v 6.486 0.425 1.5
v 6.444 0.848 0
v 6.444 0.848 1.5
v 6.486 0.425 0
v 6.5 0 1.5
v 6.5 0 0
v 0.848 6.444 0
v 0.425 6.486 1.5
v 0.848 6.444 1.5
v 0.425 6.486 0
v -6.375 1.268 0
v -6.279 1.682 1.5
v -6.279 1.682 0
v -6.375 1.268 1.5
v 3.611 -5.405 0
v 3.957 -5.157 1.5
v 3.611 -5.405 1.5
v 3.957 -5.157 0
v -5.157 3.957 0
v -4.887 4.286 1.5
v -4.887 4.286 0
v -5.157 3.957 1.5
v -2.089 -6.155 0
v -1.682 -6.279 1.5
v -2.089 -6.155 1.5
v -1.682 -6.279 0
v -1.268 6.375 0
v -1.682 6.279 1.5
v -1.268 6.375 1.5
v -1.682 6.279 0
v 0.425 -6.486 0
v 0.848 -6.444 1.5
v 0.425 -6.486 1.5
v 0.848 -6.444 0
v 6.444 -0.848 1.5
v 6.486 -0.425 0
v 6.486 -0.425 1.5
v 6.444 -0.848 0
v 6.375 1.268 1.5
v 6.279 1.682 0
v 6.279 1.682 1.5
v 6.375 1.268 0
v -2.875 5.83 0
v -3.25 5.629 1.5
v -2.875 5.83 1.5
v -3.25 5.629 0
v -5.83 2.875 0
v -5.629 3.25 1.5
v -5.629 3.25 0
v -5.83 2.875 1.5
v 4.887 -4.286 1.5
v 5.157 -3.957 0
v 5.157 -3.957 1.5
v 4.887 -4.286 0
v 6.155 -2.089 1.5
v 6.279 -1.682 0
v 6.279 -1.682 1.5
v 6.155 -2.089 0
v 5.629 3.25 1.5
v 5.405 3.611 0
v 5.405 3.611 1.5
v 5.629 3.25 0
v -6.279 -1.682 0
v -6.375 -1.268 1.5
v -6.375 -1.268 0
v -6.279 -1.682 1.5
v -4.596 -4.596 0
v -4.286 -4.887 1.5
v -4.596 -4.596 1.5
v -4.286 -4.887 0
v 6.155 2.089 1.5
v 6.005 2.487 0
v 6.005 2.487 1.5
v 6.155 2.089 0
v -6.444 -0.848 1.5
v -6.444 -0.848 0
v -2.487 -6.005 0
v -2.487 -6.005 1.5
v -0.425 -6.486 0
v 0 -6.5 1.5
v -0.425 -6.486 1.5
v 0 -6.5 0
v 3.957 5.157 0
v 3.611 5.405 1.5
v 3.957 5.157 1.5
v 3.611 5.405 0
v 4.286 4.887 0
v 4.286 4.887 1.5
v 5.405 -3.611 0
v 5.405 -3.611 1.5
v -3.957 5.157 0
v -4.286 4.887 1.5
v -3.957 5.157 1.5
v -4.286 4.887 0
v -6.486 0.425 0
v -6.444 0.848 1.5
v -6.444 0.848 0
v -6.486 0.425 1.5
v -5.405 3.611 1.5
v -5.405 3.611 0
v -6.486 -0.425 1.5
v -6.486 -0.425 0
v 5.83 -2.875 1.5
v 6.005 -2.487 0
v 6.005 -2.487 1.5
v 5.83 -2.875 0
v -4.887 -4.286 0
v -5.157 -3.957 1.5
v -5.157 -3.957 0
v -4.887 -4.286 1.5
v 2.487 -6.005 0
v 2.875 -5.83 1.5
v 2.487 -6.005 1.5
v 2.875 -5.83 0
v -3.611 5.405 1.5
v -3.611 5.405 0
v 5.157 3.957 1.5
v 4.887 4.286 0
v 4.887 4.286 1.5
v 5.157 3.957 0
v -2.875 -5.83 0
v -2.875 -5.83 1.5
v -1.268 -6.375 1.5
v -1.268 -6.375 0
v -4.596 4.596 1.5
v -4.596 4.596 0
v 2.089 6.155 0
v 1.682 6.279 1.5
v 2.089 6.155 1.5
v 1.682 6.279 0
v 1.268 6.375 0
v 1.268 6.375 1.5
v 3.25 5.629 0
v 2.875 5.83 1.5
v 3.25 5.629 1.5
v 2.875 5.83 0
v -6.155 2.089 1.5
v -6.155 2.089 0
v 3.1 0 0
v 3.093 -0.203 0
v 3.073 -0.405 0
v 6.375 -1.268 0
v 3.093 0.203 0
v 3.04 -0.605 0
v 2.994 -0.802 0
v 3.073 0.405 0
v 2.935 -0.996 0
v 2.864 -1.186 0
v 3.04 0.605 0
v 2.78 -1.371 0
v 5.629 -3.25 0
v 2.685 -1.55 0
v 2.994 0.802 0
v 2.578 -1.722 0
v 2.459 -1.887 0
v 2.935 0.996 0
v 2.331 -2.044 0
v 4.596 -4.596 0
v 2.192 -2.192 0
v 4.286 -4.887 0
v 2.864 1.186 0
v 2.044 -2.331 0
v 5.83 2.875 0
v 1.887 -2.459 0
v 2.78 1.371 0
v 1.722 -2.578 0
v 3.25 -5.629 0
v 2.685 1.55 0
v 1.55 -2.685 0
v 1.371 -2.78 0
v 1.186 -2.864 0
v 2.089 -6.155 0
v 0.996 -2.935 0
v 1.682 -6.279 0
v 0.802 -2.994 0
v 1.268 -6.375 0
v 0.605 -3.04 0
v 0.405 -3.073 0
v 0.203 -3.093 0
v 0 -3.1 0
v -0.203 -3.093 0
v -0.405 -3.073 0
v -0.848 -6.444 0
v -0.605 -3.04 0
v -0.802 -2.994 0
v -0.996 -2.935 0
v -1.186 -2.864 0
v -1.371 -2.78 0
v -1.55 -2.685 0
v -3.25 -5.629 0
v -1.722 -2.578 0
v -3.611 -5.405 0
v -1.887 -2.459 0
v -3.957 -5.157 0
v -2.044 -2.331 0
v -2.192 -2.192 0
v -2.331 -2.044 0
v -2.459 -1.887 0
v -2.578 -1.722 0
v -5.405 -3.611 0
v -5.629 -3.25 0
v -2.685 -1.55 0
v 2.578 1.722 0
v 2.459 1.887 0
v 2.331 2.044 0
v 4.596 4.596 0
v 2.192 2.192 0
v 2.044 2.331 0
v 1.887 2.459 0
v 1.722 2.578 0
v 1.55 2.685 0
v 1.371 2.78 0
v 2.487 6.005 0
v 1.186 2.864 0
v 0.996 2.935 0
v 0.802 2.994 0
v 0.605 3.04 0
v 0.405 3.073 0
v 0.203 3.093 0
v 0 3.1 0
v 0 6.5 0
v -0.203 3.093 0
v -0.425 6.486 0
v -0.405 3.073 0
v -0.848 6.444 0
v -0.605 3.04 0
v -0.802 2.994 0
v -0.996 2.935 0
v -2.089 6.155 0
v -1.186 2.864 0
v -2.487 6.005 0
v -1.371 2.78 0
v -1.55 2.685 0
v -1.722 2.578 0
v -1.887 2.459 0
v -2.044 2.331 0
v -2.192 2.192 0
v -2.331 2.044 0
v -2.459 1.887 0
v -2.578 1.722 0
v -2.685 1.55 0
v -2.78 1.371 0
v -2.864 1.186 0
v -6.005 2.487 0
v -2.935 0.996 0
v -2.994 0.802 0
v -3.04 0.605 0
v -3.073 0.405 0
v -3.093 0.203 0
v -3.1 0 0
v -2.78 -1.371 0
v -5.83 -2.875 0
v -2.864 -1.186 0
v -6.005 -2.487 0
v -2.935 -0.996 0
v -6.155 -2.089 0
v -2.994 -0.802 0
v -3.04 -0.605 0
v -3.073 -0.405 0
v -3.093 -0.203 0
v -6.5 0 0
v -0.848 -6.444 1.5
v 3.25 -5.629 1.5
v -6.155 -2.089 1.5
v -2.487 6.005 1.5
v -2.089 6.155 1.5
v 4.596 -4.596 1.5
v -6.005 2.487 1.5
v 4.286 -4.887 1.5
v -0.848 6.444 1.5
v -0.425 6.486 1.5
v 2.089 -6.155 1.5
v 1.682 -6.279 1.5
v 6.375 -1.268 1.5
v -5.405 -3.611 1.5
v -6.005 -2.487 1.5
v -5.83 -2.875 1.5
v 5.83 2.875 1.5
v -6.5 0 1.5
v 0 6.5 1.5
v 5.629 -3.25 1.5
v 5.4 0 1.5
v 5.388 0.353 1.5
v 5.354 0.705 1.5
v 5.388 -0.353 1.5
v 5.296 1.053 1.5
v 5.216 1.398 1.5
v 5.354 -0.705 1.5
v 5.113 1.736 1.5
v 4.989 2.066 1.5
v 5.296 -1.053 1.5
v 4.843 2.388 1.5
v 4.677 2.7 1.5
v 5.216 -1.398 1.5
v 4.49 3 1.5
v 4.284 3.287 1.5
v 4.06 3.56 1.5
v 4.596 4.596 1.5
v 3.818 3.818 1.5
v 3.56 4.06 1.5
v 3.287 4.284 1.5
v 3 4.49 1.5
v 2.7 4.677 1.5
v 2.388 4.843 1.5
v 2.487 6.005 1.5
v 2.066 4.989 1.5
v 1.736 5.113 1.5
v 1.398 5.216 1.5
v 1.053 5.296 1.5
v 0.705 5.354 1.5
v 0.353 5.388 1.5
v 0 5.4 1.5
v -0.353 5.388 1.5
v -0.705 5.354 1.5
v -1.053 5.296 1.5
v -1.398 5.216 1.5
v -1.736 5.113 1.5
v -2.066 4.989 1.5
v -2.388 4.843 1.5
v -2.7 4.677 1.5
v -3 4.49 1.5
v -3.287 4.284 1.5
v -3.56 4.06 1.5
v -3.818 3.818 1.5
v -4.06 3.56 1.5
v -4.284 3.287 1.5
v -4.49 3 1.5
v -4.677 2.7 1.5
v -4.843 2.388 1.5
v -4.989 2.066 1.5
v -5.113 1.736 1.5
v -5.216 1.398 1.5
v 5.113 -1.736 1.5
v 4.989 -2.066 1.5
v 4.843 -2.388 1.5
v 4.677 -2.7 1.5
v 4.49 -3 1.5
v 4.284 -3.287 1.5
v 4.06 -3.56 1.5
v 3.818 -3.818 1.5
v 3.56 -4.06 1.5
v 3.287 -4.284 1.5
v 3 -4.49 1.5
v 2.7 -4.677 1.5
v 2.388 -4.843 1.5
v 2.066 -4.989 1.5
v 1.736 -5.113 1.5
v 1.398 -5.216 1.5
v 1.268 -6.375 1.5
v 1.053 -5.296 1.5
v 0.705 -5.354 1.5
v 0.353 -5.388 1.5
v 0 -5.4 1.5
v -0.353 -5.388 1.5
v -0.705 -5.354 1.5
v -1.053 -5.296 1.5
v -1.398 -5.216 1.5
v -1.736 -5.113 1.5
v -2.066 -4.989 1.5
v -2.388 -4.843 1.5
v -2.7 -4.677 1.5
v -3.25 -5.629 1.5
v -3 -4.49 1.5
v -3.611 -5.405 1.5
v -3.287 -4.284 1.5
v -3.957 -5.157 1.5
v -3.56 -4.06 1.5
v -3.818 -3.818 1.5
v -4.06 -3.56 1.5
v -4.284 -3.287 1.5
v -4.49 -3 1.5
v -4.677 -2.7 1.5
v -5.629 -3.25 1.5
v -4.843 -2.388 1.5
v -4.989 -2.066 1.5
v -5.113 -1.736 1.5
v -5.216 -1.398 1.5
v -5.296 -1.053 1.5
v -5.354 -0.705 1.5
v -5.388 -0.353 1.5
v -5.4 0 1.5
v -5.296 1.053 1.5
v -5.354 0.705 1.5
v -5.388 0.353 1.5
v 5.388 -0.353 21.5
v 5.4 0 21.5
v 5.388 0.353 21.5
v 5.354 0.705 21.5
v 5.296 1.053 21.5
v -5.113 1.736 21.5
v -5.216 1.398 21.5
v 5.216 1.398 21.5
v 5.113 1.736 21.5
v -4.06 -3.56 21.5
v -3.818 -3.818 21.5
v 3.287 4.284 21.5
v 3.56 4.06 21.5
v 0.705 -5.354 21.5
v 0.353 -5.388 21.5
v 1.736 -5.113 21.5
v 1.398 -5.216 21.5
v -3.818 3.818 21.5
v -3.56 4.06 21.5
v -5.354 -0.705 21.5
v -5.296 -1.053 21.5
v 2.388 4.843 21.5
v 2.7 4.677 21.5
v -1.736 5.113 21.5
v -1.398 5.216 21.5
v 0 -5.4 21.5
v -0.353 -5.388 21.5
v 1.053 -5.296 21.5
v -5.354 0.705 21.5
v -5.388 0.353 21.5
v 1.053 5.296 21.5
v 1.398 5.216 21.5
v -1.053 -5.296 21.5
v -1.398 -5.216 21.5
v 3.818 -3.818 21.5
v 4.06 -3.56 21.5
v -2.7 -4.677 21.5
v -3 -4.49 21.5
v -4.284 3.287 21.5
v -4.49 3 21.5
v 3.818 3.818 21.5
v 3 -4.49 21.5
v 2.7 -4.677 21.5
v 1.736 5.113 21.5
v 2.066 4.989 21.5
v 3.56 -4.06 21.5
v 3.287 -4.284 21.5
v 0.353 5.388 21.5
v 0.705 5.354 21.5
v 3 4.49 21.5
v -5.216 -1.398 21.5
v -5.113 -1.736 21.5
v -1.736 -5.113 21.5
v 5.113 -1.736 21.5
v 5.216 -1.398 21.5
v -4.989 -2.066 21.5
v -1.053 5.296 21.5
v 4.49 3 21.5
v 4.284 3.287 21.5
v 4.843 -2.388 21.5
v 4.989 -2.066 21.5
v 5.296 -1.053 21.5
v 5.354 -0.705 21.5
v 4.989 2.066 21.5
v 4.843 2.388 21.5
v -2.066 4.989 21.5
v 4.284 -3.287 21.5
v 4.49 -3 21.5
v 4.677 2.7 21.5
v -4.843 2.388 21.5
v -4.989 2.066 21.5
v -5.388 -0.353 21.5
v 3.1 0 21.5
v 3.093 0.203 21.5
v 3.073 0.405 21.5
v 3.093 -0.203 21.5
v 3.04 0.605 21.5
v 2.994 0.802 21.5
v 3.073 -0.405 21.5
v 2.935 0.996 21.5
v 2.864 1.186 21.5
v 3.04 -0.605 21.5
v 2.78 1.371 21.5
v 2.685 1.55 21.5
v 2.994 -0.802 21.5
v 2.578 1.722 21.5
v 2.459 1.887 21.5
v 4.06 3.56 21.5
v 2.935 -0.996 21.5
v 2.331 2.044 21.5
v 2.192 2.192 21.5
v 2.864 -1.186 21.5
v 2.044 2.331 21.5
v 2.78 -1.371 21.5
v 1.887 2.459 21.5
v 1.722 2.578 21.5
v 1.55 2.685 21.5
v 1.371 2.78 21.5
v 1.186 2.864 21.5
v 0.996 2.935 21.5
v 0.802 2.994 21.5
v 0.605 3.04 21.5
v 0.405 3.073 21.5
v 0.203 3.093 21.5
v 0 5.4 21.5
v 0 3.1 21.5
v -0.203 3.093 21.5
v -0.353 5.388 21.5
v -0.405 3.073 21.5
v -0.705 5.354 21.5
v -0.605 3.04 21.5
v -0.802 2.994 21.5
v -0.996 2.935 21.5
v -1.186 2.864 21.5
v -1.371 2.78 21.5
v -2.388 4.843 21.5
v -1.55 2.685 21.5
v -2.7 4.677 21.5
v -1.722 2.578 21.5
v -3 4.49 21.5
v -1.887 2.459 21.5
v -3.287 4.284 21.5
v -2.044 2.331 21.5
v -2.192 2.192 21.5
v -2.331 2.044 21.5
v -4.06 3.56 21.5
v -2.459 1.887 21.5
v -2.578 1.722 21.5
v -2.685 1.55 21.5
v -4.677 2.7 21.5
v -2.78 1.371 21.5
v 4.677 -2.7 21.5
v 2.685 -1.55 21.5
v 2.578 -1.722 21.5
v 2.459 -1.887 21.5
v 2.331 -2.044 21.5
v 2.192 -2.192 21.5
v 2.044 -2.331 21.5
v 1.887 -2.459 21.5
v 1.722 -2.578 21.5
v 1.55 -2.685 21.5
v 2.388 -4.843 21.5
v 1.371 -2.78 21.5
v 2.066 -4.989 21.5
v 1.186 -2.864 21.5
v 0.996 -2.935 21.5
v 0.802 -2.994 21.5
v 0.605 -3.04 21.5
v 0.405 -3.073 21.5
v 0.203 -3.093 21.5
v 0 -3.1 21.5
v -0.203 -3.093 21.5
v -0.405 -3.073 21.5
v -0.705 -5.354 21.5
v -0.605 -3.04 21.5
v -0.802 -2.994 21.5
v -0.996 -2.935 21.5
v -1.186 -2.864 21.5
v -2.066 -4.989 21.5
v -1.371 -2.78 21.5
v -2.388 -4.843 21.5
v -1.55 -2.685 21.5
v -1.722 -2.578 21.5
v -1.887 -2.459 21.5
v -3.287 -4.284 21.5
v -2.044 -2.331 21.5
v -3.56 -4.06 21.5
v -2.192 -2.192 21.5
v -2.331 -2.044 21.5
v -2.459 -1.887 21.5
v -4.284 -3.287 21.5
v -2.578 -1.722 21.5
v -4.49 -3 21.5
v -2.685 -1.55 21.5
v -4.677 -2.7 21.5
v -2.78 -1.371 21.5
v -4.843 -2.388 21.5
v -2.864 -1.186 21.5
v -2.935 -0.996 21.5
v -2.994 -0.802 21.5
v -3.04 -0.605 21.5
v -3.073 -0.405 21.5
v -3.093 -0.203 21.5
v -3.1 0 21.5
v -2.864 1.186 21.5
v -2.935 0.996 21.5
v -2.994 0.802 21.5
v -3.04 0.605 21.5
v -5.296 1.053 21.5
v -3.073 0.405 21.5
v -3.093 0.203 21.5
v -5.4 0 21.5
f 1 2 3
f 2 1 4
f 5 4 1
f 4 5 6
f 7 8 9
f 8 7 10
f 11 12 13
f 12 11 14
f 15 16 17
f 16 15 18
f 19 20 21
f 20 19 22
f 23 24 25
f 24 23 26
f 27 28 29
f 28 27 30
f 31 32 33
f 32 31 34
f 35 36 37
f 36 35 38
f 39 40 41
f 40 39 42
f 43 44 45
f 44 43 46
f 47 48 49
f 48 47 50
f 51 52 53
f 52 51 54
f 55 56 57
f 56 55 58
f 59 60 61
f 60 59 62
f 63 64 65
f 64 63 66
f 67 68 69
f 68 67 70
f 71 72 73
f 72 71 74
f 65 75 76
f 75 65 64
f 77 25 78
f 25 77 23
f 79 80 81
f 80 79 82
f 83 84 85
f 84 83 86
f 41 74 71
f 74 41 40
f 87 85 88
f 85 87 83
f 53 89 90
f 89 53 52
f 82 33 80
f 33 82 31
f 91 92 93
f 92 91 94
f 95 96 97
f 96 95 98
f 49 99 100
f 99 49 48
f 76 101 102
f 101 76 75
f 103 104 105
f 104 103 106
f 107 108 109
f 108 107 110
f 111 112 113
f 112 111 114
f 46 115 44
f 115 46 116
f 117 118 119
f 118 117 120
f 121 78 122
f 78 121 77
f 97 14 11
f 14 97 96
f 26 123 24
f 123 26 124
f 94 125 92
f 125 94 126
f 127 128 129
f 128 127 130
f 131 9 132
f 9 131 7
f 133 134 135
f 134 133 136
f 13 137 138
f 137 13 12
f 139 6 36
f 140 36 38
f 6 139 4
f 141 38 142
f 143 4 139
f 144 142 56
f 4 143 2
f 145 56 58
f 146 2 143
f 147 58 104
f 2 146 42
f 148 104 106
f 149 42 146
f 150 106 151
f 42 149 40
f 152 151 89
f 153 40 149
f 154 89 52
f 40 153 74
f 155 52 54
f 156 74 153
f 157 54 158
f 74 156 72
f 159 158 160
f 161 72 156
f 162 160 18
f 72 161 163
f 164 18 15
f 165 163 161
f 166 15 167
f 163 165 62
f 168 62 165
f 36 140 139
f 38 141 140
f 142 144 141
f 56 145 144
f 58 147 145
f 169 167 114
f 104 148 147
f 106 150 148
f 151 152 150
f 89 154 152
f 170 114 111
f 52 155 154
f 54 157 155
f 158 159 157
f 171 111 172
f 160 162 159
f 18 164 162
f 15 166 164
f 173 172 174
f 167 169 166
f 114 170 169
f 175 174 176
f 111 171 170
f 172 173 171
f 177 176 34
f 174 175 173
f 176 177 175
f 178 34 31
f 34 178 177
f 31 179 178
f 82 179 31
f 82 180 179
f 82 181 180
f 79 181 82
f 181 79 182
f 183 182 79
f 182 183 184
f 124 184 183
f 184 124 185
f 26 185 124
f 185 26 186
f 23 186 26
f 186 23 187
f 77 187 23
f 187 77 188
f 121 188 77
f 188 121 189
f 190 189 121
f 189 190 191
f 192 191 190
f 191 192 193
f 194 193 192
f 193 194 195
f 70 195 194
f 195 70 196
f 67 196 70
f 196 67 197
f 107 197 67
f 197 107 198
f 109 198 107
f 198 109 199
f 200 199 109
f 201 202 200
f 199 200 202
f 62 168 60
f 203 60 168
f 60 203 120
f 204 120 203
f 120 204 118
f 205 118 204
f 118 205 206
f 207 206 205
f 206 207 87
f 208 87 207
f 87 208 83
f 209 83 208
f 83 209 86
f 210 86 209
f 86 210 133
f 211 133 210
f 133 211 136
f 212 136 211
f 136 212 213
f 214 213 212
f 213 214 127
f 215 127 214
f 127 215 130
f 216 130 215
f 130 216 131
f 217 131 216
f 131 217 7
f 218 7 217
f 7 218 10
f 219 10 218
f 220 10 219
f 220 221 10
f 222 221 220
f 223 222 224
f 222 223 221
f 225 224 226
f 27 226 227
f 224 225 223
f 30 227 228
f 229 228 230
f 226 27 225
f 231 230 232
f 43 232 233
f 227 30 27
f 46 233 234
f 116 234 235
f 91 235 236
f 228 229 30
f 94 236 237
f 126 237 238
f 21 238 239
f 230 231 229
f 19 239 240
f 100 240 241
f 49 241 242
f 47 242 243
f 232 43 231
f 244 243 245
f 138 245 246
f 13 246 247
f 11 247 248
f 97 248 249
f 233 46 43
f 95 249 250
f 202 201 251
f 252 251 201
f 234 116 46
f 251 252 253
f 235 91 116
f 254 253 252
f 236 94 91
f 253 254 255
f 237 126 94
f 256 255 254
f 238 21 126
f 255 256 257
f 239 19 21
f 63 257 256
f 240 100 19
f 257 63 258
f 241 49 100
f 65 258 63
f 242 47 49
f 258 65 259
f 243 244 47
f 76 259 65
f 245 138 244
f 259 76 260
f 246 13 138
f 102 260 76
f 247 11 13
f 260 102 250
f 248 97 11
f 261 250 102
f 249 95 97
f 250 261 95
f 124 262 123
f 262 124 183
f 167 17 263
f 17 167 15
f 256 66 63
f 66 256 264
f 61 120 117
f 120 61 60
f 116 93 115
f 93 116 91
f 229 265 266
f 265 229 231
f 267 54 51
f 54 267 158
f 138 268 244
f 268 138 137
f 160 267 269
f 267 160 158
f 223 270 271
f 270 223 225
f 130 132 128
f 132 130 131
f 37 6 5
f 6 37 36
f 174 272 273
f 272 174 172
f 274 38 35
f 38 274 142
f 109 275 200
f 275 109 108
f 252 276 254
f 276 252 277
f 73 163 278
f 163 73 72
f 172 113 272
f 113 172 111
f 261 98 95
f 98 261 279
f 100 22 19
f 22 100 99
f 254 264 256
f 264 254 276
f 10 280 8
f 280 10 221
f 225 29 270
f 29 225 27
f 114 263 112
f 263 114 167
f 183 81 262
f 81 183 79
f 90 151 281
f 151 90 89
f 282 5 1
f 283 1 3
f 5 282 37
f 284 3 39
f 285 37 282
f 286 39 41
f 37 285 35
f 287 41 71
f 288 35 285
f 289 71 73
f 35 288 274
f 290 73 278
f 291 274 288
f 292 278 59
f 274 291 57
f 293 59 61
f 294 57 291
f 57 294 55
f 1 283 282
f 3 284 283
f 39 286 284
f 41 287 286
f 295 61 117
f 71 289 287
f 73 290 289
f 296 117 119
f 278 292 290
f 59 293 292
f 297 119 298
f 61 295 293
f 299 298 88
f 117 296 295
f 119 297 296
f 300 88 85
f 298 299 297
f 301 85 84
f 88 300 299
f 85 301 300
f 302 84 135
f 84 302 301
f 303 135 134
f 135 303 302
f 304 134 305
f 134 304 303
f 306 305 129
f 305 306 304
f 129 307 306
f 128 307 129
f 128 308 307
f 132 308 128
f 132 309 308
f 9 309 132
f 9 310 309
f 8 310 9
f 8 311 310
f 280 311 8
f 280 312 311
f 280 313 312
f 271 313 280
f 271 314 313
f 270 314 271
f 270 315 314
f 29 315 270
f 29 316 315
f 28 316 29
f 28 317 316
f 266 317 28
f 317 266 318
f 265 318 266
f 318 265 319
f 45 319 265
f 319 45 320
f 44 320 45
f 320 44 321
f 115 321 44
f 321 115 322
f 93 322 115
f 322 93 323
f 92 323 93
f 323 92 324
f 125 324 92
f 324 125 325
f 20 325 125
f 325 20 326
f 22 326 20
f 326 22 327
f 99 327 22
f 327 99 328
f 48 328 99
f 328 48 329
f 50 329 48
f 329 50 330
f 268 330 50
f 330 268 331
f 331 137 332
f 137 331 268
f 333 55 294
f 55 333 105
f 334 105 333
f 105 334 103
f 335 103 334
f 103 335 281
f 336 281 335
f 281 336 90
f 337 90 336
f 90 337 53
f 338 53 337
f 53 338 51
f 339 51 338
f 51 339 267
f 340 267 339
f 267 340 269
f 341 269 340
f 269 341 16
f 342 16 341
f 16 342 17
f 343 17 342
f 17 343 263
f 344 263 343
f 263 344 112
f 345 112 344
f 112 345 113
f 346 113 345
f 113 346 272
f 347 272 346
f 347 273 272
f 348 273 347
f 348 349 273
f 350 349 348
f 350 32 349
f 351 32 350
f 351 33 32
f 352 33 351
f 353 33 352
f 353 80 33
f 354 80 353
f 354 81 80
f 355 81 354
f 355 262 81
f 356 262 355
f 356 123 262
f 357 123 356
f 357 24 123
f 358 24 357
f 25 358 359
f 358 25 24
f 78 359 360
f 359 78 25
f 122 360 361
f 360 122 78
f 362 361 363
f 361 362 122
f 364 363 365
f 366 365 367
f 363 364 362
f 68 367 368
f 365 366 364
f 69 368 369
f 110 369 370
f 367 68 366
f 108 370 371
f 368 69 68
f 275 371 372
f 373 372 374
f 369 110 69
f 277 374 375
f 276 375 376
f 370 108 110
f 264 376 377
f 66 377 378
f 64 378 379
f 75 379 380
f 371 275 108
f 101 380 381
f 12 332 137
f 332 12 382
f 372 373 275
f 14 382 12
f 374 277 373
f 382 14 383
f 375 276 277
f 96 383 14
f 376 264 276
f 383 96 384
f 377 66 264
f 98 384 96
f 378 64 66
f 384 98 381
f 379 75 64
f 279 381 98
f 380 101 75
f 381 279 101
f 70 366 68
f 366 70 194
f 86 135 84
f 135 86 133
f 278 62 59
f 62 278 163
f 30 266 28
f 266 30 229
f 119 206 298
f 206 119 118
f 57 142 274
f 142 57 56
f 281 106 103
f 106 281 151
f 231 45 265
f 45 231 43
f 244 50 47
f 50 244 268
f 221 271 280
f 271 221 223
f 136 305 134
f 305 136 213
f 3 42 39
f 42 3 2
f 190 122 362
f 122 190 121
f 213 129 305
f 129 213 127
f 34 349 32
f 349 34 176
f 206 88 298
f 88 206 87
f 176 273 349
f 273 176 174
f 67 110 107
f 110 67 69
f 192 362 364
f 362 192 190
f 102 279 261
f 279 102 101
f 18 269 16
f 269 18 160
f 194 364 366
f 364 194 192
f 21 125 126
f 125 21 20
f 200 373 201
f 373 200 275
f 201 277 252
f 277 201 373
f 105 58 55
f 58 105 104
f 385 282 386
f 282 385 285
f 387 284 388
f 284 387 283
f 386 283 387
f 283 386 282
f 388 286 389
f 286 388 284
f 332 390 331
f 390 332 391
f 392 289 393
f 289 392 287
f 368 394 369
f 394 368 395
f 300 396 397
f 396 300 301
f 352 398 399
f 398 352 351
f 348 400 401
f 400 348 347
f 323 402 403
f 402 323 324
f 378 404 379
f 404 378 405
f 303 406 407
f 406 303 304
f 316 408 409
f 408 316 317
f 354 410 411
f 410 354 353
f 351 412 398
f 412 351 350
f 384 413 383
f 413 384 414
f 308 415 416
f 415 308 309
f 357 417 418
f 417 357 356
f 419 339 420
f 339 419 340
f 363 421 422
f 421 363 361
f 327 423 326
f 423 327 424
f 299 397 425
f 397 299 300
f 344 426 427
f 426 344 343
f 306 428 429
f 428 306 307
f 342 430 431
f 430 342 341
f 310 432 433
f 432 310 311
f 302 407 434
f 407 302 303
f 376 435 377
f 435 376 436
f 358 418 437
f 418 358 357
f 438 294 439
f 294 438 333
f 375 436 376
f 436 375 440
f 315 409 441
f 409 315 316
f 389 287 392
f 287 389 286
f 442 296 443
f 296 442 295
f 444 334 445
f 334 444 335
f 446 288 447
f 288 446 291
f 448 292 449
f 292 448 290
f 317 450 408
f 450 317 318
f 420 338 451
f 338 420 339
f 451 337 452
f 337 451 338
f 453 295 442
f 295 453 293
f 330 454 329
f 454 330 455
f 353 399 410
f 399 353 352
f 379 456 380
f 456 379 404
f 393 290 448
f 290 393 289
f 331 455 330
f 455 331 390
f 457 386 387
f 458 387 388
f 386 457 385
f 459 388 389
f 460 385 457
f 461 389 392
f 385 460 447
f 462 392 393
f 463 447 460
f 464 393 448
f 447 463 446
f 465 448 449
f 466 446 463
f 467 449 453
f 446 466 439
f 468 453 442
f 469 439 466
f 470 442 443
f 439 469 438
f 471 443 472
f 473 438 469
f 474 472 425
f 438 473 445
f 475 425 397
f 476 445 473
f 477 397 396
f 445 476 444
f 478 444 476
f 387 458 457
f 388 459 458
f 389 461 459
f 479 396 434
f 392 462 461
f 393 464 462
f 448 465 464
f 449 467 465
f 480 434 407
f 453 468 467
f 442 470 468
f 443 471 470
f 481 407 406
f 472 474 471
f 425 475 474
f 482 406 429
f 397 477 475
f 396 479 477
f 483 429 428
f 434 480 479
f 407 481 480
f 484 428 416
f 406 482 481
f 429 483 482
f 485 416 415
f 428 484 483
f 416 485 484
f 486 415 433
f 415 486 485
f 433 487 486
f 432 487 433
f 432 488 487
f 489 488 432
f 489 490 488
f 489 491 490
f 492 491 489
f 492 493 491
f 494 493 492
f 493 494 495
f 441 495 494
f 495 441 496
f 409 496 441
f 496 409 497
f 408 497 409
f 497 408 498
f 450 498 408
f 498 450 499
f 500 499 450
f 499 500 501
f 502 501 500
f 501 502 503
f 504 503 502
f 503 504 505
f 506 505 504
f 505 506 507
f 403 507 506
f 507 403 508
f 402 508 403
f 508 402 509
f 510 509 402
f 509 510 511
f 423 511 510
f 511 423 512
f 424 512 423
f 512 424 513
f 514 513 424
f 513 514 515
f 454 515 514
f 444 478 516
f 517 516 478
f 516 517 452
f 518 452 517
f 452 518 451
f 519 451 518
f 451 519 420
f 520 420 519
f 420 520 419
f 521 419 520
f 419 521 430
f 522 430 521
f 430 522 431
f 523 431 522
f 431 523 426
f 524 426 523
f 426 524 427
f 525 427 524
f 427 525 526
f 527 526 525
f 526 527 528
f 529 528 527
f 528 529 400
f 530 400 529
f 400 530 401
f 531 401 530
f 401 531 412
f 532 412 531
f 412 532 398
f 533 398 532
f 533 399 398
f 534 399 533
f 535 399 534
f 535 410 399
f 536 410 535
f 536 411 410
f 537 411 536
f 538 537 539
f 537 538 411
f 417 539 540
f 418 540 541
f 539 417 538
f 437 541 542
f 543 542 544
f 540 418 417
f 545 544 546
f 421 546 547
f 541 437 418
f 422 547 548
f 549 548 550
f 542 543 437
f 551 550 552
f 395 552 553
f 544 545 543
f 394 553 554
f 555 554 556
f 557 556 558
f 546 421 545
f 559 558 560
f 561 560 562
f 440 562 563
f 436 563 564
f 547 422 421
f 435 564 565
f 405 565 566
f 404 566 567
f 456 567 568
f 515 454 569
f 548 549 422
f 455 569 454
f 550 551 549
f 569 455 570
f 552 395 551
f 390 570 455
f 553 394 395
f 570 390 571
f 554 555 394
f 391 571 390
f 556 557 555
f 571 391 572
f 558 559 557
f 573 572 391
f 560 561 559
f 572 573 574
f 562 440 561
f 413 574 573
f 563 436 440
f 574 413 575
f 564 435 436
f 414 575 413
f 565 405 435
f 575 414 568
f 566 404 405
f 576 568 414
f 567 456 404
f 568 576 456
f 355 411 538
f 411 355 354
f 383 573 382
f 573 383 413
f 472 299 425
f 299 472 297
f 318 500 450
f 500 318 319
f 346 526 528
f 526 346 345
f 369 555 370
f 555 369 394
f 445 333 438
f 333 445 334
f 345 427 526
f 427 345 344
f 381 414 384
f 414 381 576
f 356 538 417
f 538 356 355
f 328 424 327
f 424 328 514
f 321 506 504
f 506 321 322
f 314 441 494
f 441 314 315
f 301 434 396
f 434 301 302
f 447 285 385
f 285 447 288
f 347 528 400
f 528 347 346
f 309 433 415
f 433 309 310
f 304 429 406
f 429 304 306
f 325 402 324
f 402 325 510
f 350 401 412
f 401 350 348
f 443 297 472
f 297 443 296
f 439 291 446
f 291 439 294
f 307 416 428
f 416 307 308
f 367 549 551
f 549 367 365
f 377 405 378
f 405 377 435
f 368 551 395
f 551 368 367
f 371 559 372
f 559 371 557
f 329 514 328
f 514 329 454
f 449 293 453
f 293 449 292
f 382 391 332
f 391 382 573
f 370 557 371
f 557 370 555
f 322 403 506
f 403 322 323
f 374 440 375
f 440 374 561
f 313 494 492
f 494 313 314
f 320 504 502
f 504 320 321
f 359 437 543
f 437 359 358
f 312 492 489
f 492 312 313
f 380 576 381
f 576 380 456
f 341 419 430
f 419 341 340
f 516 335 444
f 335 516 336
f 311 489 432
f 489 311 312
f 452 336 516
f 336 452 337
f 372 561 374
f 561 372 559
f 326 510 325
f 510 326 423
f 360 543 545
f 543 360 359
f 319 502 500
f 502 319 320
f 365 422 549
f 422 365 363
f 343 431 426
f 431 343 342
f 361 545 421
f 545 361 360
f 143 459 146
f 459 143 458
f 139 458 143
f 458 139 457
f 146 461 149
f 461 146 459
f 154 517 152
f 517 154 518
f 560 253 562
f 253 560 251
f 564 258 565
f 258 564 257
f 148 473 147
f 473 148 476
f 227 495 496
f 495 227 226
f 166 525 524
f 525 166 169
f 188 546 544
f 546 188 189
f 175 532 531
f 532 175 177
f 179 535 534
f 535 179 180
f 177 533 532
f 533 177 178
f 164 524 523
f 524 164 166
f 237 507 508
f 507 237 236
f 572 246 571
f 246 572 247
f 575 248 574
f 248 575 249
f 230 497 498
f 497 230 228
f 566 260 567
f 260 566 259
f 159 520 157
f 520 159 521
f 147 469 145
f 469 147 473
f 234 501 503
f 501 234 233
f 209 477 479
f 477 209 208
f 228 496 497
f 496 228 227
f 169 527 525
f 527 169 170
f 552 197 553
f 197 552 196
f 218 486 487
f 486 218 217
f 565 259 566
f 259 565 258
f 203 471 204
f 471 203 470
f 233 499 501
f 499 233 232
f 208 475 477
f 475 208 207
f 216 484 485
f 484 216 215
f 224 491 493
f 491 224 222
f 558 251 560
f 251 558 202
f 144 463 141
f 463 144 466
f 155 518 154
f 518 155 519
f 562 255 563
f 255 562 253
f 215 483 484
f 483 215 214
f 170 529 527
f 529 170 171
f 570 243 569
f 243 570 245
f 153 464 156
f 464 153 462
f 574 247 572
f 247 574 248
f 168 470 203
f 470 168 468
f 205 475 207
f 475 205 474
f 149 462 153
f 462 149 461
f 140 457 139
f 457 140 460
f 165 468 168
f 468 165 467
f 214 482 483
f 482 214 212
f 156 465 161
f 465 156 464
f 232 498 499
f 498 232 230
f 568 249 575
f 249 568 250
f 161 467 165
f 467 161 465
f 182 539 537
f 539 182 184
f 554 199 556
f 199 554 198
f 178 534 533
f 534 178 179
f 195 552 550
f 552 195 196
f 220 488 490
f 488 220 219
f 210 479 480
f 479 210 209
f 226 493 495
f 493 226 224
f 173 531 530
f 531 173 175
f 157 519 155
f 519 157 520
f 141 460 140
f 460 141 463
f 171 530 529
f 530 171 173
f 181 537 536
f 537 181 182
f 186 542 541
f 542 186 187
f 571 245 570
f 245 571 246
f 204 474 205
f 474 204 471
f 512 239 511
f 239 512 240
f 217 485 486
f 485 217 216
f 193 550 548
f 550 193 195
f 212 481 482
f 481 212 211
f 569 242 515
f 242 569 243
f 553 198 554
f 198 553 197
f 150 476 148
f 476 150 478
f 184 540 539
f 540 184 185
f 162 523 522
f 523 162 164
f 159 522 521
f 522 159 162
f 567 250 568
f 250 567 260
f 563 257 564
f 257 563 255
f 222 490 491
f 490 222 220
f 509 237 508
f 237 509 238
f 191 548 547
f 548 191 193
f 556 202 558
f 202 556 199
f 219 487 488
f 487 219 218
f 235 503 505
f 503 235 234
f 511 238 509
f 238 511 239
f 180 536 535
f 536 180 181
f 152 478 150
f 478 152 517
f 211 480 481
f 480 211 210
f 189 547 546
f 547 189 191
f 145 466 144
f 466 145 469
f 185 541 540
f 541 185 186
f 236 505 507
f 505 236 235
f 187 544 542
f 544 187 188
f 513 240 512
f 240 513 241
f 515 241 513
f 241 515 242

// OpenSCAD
// Adapter sleeve: 0.2 mL PCR tube for 1.5 mL rack hole
// Print orientation: collar on bed (z = 0 to 1.5), sleeve body rises to z = 21.5

$fn = 96;

// --- Dimensions (mm) ---
collar_d      = 13;    // collar outer diameter
collar_h      = 1.5;   // collar thickness (z = 0 to 1.5)
sleeve_od     = 10.8;  // sleeve body outer diameter
sleeve_h      = 20;    // sleeve body height above collar (z = 1.5 to 21.5)
bore_d        = 6.2;   // through-bore diameter
eps           = 0.5;   // cutter overshoot past faces

total_h = collar_h + sleeve_h;  // full height (21.5)

difference() {
    union() {
        // Collar
        cylinder(d = collar_d, h = collar_h);
        // Sleeve body (slightly overlapping collar for a clean union)
        translate([0, 0, collar_h - 0.01])
            cylinder(d = sleeve_od, h = sleeve_h + 0.01);
    }
    // Through-bore
    translate([0, 0, -eps])
        cylinder(d = bore_d, h = total_h + 2 * eps);
}
